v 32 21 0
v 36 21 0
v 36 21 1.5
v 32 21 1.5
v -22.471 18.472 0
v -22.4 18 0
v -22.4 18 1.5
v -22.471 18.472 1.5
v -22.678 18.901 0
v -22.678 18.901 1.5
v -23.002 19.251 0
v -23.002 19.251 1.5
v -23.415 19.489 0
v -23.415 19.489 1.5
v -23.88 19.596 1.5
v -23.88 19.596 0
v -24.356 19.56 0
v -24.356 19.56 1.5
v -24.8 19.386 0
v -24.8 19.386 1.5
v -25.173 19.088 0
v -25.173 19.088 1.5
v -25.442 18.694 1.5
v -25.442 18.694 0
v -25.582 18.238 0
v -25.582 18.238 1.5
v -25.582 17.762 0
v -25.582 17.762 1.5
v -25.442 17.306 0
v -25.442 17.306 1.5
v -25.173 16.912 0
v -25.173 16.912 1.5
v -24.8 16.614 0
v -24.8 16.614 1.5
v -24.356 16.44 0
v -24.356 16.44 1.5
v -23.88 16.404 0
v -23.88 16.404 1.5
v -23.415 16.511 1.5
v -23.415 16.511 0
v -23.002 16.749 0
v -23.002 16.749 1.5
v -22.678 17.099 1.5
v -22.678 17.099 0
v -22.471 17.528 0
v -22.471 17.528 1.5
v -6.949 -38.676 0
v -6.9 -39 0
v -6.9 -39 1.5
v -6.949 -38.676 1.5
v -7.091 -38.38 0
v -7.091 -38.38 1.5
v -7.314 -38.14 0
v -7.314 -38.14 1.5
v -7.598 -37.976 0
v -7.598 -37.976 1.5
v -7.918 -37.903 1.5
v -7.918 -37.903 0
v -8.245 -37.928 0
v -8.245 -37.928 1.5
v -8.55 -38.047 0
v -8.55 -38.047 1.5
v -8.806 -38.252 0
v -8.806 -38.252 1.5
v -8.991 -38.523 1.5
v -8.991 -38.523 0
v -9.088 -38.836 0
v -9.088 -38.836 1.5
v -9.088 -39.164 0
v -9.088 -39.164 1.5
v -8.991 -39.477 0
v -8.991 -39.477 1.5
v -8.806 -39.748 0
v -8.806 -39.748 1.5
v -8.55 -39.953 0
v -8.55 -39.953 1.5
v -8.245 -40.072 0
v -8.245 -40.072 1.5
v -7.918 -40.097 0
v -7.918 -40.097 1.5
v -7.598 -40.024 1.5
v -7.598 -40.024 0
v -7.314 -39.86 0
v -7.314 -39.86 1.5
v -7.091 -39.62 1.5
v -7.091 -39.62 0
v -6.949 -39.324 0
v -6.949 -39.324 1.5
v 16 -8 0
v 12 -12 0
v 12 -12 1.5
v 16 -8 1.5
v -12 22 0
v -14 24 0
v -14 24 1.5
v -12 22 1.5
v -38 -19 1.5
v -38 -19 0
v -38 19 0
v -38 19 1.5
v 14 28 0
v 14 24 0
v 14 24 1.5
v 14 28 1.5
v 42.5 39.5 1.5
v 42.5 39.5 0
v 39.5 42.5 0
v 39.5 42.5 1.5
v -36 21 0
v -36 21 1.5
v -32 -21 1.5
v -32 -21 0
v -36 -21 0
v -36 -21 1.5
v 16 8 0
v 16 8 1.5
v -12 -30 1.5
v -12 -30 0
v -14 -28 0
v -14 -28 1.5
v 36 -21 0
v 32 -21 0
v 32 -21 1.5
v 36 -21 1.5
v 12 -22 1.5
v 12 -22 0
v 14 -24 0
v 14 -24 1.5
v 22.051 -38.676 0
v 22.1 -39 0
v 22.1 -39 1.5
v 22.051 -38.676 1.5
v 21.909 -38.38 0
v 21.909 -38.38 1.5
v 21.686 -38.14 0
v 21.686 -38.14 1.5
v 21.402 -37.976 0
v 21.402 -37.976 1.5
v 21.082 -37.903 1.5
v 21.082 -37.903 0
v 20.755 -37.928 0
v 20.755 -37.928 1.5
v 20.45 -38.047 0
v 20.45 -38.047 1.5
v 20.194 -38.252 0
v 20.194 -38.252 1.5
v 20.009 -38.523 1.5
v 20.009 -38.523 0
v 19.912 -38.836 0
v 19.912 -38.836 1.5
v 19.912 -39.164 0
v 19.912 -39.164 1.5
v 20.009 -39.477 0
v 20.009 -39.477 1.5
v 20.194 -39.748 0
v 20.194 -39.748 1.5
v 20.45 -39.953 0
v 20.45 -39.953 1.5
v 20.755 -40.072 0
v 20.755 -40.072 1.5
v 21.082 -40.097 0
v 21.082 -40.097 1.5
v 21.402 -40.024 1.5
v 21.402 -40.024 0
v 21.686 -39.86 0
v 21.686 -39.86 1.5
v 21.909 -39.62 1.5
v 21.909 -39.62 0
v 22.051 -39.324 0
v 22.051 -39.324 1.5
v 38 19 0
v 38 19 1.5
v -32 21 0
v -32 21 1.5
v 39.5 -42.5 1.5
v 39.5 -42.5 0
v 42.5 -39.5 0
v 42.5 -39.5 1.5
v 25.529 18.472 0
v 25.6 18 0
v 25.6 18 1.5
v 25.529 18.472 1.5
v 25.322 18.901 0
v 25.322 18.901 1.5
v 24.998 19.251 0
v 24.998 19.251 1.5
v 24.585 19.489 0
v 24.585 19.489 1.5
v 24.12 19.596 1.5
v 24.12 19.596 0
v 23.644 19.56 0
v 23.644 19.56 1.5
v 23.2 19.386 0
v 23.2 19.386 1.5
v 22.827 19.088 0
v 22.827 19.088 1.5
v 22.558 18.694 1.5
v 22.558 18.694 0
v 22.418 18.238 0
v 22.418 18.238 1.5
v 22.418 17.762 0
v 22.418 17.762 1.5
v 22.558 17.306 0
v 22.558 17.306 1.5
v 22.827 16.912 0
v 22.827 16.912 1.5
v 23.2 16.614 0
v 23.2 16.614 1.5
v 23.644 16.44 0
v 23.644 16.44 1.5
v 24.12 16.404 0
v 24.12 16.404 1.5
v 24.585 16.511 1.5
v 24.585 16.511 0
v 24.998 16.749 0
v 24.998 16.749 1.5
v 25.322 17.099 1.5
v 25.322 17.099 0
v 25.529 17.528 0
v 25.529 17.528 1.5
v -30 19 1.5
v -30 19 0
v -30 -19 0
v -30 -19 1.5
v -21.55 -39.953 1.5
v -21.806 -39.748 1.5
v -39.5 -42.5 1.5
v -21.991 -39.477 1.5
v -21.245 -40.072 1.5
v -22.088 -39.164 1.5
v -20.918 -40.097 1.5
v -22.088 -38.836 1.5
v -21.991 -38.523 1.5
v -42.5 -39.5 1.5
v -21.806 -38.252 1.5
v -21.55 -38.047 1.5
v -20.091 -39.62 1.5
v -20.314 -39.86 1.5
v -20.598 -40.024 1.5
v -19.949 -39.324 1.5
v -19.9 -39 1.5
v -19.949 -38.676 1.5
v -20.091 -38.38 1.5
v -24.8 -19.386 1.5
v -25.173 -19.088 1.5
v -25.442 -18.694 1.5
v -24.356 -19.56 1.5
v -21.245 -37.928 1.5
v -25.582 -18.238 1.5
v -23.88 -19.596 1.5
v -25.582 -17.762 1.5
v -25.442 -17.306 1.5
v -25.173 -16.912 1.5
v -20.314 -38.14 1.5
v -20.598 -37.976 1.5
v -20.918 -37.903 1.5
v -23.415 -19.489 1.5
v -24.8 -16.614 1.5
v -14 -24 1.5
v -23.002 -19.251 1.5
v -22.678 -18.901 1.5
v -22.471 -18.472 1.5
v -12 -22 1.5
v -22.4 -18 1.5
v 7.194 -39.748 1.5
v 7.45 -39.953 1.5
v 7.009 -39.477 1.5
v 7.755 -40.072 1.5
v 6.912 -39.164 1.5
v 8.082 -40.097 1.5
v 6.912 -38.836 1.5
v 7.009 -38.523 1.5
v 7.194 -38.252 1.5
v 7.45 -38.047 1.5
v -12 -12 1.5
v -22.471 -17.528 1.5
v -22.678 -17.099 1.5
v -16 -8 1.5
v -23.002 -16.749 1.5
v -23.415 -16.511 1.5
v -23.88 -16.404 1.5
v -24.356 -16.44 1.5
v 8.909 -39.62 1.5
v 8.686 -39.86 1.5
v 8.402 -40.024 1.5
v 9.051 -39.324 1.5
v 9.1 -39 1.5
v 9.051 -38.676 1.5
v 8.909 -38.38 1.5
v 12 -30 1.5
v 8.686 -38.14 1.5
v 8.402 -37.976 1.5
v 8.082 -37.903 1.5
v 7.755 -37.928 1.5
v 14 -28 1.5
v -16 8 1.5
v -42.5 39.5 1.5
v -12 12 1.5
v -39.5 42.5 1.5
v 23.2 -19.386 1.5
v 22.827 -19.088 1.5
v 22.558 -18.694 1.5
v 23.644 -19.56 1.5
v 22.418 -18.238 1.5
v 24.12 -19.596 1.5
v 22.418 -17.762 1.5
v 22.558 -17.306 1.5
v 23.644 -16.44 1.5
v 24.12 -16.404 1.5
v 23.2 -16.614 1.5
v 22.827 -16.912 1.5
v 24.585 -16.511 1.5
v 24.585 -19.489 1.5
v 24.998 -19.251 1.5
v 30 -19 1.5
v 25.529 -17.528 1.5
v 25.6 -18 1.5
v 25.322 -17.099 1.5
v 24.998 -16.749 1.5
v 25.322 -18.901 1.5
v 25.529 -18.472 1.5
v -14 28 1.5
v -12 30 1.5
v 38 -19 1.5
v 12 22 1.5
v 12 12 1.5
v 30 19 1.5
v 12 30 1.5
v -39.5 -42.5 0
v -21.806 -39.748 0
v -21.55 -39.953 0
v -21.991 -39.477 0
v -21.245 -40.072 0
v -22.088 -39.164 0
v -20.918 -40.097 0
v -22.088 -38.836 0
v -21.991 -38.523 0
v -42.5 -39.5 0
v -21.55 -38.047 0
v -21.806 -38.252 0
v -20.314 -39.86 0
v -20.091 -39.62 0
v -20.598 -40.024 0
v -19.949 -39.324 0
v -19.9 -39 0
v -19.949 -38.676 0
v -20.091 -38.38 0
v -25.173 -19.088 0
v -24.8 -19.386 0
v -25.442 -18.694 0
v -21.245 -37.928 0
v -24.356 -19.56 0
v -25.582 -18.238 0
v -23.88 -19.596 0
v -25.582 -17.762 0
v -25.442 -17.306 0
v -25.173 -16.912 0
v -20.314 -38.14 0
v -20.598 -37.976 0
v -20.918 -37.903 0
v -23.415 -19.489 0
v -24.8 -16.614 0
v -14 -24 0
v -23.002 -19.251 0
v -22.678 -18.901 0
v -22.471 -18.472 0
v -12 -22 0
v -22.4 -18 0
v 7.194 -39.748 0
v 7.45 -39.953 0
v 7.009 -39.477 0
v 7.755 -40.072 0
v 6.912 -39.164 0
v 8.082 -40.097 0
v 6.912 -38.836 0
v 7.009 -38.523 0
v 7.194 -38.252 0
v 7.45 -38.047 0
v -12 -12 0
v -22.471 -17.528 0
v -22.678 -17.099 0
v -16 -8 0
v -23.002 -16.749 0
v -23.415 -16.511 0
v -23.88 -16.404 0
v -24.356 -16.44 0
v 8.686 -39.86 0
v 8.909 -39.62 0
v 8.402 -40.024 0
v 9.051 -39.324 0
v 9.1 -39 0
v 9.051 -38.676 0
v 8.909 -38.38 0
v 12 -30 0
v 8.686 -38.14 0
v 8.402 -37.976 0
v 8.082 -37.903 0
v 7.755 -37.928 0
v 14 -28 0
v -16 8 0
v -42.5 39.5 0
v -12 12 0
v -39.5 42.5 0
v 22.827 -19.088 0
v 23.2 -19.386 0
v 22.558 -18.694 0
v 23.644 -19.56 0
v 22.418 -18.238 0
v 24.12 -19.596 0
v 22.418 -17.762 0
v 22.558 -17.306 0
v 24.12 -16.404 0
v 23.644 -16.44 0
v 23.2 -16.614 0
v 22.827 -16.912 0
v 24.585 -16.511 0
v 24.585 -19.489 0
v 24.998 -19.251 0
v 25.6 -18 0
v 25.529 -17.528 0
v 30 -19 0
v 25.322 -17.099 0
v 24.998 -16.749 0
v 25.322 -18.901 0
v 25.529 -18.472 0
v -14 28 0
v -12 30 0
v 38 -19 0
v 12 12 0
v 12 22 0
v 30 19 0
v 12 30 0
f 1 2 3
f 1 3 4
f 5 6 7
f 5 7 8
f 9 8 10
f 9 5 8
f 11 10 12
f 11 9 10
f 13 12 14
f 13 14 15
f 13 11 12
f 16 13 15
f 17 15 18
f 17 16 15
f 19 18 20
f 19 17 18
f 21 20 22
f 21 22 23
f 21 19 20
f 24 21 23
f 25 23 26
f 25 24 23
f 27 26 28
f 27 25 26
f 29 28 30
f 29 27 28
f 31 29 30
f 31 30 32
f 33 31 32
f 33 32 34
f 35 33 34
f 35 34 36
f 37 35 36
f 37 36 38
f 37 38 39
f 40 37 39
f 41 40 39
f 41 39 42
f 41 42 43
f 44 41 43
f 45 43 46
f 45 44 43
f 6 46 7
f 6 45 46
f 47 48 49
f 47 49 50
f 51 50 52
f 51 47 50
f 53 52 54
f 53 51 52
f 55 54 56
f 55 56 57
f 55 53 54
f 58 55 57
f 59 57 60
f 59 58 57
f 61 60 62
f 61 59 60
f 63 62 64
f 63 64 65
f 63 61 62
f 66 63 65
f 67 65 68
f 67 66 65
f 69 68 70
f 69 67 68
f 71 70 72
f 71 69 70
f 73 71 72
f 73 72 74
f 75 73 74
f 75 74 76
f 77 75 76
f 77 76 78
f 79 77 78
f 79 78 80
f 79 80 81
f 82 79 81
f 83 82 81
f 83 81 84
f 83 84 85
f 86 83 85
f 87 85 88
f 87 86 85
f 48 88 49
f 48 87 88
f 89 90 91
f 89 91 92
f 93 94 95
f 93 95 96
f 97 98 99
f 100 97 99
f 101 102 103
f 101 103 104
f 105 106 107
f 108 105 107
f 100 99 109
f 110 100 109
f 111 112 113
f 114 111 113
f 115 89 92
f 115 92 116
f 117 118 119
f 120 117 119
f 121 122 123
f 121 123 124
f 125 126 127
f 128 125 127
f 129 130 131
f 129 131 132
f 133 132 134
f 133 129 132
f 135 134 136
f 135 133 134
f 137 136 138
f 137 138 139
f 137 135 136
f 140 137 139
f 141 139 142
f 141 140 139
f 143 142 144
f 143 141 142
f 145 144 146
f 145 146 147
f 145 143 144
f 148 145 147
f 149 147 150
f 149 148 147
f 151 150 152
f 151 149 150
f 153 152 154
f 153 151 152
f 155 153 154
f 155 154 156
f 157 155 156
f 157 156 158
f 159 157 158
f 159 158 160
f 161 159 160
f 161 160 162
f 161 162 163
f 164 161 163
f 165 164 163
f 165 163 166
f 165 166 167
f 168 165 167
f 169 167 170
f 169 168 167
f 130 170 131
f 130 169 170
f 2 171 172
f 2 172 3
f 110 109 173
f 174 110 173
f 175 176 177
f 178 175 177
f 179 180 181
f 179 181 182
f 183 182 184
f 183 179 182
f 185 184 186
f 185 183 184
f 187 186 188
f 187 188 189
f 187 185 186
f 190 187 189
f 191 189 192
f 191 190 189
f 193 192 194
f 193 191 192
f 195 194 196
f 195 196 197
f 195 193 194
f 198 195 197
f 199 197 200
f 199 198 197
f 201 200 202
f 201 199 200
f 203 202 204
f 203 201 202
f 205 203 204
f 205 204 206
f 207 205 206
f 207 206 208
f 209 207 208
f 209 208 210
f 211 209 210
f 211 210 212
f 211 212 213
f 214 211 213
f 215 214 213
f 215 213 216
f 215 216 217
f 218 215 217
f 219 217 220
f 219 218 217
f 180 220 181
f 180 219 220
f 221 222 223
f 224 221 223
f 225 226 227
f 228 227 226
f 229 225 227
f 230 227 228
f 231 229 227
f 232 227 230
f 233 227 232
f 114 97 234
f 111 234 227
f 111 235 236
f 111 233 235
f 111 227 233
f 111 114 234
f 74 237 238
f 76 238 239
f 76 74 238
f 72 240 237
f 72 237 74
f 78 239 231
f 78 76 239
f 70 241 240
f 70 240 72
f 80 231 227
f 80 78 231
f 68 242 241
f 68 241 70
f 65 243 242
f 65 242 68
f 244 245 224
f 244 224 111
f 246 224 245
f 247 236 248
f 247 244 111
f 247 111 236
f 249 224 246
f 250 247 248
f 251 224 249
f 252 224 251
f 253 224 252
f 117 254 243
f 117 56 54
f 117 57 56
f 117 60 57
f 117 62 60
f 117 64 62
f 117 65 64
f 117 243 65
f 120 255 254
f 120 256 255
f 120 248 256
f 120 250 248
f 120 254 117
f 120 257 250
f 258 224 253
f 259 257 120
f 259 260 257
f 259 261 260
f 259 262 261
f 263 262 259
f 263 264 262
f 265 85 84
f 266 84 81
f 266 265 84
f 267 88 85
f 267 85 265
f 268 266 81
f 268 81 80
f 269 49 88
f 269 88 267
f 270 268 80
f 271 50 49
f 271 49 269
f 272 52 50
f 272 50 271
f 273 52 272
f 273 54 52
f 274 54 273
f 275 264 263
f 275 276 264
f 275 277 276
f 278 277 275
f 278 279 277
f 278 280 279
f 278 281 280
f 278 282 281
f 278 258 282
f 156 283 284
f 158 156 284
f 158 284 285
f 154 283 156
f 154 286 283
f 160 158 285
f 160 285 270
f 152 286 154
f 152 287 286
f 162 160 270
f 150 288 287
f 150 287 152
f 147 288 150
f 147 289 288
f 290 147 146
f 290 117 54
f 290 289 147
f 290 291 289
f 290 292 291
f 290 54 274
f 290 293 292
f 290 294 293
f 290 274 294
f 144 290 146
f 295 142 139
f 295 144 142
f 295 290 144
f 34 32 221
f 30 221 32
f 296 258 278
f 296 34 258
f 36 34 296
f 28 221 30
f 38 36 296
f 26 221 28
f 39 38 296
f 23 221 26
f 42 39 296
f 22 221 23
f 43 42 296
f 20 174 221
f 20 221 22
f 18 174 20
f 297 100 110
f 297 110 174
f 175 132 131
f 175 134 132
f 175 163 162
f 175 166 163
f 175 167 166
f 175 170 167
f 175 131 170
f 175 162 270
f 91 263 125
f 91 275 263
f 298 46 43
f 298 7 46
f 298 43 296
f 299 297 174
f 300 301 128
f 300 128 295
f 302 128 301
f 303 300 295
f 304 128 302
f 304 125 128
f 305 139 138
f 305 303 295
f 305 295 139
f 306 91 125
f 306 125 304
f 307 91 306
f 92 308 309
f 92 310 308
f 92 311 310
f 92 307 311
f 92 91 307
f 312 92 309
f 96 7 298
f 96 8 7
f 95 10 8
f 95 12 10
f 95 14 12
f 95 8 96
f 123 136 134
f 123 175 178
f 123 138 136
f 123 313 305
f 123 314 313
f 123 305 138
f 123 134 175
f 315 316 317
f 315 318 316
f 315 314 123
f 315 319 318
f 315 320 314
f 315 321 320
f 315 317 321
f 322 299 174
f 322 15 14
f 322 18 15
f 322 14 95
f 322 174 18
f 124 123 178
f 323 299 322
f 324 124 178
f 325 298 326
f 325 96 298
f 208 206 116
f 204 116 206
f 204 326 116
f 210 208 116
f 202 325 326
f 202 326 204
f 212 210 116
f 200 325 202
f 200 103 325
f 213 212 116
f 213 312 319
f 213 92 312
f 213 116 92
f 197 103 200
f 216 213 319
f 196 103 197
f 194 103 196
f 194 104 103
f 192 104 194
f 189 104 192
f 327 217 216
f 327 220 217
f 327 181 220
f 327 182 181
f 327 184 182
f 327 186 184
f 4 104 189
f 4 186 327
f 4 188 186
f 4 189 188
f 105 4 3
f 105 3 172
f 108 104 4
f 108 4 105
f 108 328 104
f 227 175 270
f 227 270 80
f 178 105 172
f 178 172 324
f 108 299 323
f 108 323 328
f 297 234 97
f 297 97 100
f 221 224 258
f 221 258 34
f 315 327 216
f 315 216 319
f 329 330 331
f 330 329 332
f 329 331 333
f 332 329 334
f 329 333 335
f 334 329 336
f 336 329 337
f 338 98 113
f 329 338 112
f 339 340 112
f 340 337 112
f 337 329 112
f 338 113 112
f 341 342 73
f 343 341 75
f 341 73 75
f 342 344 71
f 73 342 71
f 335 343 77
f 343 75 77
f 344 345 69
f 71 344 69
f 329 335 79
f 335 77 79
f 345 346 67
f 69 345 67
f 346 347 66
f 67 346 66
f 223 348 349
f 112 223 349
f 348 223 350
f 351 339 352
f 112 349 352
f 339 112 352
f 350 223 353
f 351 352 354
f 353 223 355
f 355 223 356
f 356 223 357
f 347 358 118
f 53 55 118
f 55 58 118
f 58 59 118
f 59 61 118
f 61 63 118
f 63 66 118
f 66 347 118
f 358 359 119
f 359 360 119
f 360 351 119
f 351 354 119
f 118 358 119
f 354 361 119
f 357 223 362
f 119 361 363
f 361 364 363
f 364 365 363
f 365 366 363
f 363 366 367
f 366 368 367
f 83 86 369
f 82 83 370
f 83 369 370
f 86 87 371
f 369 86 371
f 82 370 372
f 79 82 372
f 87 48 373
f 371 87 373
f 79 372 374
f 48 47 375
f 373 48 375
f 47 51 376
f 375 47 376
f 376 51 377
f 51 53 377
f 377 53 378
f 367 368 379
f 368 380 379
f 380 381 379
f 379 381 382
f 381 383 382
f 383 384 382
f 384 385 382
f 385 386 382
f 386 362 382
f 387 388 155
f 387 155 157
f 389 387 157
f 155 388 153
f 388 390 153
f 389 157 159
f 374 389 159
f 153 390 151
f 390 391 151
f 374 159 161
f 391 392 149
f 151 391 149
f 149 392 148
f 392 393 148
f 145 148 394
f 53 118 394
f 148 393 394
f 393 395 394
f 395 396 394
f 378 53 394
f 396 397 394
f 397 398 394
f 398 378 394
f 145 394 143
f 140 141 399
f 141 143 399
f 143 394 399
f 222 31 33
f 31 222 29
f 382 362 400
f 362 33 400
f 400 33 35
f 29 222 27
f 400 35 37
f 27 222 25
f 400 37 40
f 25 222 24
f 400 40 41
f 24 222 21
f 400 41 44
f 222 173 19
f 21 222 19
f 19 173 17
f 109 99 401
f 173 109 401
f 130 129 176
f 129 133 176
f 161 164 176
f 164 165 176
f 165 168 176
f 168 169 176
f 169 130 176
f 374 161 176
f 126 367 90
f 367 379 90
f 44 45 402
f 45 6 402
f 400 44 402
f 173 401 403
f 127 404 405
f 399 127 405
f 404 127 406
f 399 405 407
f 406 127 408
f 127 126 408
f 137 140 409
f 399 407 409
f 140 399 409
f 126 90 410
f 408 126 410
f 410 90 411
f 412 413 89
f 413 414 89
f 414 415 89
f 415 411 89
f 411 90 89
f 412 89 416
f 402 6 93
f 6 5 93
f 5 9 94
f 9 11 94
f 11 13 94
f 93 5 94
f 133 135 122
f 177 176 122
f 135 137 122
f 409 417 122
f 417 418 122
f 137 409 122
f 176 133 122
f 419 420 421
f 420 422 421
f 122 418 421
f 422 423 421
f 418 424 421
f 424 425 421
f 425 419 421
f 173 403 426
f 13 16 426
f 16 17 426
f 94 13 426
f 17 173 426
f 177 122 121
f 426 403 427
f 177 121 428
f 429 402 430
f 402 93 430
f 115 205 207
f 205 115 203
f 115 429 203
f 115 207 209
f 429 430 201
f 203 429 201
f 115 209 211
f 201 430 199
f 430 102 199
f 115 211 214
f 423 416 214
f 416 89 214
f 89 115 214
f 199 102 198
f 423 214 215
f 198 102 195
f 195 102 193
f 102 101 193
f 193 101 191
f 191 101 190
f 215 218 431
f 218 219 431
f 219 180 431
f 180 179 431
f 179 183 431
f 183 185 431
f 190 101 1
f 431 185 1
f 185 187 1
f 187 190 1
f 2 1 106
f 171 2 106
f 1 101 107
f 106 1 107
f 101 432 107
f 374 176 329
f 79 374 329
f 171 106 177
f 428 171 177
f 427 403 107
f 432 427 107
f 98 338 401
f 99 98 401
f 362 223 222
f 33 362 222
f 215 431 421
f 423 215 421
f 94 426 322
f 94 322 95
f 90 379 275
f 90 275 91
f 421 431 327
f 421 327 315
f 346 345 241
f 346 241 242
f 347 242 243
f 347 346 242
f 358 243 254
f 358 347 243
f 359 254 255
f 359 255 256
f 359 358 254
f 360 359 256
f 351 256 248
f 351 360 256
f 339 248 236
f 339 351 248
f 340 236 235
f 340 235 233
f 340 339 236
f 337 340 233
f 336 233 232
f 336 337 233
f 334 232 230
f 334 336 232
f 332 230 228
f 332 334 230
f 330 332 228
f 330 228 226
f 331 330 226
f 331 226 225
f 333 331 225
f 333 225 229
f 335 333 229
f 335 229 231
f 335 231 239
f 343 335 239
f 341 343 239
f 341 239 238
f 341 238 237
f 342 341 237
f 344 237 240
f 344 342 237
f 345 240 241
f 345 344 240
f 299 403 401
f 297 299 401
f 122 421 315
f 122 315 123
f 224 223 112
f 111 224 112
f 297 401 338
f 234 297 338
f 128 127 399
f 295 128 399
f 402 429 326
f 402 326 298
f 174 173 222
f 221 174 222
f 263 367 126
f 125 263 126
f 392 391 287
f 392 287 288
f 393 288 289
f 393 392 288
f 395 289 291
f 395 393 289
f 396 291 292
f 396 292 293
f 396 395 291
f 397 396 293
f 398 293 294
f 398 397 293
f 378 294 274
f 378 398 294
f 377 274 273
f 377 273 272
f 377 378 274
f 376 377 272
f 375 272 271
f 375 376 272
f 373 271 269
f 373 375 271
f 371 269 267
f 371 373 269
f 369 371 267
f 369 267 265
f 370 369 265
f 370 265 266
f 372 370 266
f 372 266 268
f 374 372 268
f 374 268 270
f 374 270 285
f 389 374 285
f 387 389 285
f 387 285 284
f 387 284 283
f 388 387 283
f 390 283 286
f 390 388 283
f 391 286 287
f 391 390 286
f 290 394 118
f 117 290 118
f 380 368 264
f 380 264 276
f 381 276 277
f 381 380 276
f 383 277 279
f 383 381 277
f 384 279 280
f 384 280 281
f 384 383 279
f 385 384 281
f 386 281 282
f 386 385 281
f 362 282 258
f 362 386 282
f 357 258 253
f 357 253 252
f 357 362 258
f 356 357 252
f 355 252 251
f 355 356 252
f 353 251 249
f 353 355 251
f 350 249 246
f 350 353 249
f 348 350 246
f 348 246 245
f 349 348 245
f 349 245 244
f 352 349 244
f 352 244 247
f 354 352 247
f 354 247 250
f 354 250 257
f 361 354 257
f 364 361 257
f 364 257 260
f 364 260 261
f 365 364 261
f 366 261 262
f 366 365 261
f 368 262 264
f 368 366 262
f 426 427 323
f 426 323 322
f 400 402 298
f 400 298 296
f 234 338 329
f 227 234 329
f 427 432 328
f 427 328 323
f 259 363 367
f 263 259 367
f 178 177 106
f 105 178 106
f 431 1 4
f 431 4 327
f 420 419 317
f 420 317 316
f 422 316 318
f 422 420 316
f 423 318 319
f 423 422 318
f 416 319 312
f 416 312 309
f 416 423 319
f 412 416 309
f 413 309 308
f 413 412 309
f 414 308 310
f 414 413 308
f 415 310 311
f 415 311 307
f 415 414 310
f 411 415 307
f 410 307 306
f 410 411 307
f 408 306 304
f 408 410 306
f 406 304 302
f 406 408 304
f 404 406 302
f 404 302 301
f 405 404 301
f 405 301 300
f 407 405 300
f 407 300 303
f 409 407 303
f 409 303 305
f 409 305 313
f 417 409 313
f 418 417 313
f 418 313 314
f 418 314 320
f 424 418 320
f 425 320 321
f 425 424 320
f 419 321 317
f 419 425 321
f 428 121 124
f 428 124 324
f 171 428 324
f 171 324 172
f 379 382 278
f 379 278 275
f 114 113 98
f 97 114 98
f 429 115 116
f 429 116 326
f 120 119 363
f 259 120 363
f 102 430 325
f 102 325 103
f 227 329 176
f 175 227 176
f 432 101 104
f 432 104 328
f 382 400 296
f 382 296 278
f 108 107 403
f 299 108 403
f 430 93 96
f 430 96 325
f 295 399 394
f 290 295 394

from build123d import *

# Parameters (mm, degrees)
SKETCH_1_R            = 1.6
SKETCH_1_R_2          = 1.1
F_85_1P5MM_DEPTH      = 1.5
CUT_EXTRUDE_384_DEPTH = 1.5


with BuildPart() as part:
    # 草图1 → 85方雷达盖板_1p5mm (new body)
    with BuildSketch(Plane.XY):
        Polygon((-42.5, -39.5), (-39.5, -42.5), (39.5, -42.5), (42.5, -39.5), (42.5, 39.5), (39.5, 42.5), (-39.5, 42.5), (-42.5, 39.5), align=None)
        with Locations((-24, -18)):
            Circle(SKETCH_1_R, mode=Mode.SUBTRACT)
        with Locations((-24, 18)):
            Circle(SKETCH_1_R, mode=Mode.SUBTRACT)
        with Locations((24, -18)):
            Circle(SKETCH_1_R, mode=Mode.SUBTRACT)
        with Locations((24, 18)):
            Circle(SKETCH_1_R, mode=Mode.SUBTRACT)
        with Locations((-21, -39)):
            Circle(SKETCH_1_R_2, mode=Mode.SUBTRACT)
        with Locations((-8, -39)):
            Circle(SKETCH_1_R_2, mode=Mode.SUBTRACT)
        with Locations((8, -39)):
            Circle(SKETCH_1_R_2, mode=Mode.SUBTRACT)
        with Locations((21, -39)):
            Circle(SKETCH_1_R_2, mode=Mode.SUBTRACT)
    extrude(amount=F_85_1P5MM_DEPTH)

    # 草图4 → Cut-Extrude 384 (cut)
    with BuildSketch(Plane.XY):
        Polygon((-12, -12), (12, -12), (16, -8), (16, 8), (12, 12), (-12, 12), (-16, 8), (-16, -8), align=None)
        Polygon((-32, -21), (-36, -21), (-38, -19), (-38, 19), (-36, 21), (-32, 21), (-30, 19), (-30, -19), align=None)
        Polygon((32, -21), (36, -21), (38, -19), (38, 19), (36, 21), (32, 21), (30, 19), (30, -19), align=None)
        Polygon((-12, -22), (12, -22), (14, -24), (14, -28), (12, -30), (-12, -30), (-14, -28), (-14, -24), align=None)
        Polygon((-12, 22), (12, 22), (14, 24), (14, 28), (12, 30), (-12, 30), (-14, 28), (-14, 24), align=None)
    extrude(amount=CUT_EXTRUDE_384_DEPTH, mode=Mode.SUBTRACT)


solid = part.part
